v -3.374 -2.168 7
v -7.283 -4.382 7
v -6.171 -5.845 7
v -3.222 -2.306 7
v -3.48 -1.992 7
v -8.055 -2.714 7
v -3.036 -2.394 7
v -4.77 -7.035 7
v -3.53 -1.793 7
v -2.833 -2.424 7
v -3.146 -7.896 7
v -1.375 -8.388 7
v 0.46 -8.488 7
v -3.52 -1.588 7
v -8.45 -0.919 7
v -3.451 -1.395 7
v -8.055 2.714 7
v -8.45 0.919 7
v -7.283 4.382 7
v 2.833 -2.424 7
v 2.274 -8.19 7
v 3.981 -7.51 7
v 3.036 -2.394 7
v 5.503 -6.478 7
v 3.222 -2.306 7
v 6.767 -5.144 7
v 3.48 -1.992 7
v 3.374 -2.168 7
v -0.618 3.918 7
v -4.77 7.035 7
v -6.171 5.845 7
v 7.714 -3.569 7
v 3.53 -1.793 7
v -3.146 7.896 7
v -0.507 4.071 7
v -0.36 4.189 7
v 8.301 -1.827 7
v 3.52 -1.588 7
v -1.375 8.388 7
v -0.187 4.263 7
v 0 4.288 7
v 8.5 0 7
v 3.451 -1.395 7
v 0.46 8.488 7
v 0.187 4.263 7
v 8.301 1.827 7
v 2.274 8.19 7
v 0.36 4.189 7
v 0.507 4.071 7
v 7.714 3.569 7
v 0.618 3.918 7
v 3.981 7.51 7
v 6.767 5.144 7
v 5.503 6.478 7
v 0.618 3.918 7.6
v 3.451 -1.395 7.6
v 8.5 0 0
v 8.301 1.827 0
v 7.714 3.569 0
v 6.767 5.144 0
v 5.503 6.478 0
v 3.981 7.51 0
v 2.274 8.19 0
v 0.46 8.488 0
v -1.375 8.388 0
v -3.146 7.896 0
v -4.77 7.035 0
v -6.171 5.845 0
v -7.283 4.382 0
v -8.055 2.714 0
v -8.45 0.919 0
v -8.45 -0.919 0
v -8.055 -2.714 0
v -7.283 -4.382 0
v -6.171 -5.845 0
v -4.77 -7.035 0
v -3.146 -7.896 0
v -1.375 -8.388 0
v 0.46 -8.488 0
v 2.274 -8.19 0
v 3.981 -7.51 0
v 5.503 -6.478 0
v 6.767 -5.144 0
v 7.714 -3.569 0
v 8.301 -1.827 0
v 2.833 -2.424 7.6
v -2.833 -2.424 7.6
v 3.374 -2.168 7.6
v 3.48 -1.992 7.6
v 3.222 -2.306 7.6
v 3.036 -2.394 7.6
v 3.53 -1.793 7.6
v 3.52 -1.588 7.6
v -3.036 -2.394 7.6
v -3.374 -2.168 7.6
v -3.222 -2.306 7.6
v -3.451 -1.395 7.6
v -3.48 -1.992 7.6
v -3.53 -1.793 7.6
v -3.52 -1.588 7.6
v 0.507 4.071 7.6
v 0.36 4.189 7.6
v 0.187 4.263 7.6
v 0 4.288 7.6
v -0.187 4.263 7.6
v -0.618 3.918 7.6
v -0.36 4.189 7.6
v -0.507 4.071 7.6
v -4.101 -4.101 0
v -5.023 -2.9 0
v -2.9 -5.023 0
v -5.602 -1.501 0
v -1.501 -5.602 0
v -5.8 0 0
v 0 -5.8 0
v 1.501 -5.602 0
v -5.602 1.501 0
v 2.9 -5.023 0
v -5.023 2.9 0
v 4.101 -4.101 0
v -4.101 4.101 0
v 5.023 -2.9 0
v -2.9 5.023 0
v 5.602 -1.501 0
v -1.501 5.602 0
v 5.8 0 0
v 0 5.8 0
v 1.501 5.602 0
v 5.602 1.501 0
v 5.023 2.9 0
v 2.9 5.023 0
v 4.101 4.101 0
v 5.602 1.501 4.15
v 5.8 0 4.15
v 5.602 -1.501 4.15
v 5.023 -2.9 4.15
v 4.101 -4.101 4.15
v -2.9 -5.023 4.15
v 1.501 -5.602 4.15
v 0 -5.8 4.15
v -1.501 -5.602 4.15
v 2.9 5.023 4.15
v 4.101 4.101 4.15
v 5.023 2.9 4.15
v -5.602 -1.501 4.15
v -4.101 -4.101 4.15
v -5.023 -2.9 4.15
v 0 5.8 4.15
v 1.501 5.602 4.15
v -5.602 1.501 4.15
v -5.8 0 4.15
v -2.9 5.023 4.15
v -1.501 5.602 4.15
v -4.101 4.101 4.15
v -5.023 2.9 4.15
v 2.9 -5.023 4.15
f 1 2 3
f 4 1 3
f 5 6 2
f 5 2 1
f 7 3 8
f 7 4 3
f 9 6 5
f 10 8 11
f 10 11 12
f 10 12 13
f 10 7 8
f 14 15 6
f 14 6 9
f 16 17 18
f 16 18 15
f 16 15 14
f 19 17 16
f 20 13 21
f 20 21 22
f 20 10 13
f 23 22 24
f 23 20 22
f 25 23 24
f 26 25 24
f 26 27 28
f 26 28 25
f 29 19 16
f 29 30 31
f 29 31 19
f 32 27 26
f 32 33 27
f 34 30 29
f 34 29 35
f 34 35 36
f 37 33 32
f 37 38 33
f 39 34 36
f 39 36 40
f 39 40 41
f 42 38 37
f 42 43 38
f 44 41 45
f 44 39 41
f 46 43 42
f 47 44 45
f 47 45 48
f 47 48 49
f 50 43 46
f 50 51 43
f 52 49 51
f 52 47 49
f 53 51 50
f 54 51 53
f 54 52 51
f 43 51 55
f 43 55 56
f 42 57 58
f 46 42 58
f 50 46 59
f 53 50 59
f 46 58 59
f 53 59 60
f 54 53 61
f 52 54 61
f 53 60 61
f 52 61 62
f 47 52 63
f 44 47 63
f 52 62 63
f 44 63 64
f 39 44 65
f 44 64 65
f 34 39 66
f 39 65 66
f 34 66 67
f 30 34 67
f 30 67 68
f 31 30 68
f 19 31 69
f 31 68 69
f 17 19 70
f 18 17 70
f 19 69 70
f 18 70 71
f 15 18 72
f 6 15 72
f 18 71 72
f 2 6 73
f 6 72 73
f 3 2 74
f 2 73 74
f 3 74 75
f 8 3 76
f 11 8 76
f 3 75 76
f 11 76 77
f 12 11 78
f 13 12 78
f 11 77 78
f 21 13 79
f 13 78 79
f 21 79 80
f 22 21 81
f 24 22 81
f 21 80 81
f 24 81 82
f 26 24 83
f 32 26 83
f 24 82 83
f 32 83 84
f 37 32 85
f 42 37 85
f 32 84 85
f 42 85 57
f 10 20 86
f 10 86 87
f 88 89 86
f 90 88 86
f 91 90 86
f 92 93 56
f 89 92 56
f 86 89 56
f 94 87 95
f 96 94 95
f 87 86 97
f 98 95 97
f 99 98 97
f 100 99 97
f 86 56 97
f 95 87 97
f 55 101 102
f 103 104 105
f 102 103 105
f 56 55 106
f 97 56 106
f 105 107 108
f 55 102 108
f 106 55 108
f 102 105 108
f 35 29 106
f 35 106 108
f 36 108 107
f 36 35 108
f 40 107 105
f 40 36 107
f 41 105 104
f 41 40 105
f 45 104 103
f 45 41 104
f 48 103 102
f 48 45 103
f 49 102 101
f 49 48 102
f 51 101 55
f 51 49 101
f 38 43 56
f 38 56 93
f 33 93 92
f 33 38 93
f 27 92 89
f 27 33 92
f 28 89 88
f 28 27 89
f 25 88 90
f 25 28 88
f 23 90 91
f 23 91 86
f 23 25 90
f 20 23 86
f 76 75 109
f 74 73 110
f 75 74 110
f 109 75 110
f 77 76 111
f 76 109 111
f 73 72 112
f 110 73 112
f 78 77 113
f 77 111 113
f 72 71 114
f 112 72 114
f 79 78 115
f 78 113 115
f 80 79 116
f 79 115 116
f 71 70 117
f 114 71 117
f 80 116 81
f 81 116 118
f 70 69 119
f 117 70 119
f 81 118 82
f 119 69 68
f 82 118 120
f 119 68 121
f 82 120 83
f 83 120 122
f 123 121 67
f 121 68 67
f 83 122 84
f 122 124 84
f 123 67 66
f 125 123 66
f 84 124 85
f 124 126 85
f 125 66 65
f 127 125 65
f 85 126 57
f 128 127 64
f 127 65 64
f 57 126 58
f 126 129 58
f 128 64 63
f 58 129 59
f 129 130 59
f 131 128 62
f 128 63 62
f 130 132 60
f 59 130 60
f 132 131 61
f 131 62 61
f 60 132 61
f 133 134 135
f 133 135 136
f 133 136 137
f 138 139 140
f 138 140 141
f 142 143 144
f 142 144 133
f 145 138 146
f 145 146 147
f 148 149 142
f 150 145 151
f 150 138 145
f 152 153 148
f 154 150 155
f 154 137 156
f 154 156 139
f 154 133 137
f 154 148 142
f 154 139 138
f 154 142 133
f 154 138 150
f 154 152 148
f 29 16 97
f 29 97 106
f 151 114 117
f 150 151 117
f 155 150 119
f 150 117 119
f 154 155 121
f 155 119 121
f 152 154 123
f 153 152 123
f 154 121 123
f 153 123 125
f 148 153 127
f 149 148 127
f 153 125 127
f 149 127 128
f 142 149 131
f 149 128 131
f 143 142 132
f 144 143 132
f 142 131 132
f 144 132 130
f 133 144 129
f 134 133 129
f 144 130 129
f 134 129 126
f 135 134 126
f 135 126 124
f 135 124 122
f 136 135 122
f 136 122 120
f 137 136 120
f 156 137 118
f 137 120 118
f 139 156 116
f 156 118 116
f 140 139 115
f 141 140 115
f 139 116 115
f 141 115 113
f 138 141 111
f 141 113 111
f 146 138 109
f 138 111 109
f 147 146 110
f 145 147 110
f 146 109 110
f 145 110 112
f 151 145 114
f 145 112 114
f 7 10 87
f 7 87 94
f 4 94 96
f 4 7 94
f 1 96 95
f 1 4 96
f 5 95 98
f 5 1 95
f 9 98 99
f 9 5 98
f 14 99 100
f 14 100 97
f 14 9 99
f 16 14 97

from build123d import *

# Parameters (mm, degrees)
SKETCH1_R           = 8.5
BOSS_EXTRUDE1_DEPTH = 7
BOSS_EXTRUDE2_DEPTH = 0.6
SKETCH3_R           = 5.8
CUT_EXTRUDE1_DEPTH  = 4.15


with BuildPart() as part:
    # Sketch1 → Boss-Extrude1 (new body)
    with BuildSketch(Plane.XY):
        Circle(SKETCH1_R)
    extrude(amount=BOSS_EXTRUDE1_DEPTH)

    # Sketch2 → Boss-Extrude2 (add)
    with BuildSketch(Plane.XY.offset(7)):
        with BuildLine():
            Line((-3.450980392, -1.394716626), (-0.617647059, 3.917783374))
            ThreePointArc((-0.617647059, 3.917783374), (0, 4.28837161), (0.617647059, 3.917783374))
            Line((0.617647059, 3.917783374), (3.450980392, -1.394716626))
            ThreePointArc((3.450980392, -1.394716626), (3.433578381, -2.084275419), (2.833333333, -2.42412839))
            Line((2.833333333, -2.42412839), (-2.833333333, -2.42412839))
            ThreePointArc((-2.833333333, -2.42412839), (-3.433578381, -2.084275419), (-3.450980392, -1.394716626))
        make_face()
    extrude(amount=BOSS_EXTRUDE2_DEPTH)

    # Sketch3 → Cut-Extrude1 (cut)
    with BuildSketch(Plane(origin=(0, 0, 0), x_dir=(-1, 0, 0), z_dir=(0, 0, -1))):
        Circle(SKETCH3_R)
    extrude(amount=-CUT_EXTRUDE1_DEPTH, mode=Mode.SUBTRACT)


solid = part.part
